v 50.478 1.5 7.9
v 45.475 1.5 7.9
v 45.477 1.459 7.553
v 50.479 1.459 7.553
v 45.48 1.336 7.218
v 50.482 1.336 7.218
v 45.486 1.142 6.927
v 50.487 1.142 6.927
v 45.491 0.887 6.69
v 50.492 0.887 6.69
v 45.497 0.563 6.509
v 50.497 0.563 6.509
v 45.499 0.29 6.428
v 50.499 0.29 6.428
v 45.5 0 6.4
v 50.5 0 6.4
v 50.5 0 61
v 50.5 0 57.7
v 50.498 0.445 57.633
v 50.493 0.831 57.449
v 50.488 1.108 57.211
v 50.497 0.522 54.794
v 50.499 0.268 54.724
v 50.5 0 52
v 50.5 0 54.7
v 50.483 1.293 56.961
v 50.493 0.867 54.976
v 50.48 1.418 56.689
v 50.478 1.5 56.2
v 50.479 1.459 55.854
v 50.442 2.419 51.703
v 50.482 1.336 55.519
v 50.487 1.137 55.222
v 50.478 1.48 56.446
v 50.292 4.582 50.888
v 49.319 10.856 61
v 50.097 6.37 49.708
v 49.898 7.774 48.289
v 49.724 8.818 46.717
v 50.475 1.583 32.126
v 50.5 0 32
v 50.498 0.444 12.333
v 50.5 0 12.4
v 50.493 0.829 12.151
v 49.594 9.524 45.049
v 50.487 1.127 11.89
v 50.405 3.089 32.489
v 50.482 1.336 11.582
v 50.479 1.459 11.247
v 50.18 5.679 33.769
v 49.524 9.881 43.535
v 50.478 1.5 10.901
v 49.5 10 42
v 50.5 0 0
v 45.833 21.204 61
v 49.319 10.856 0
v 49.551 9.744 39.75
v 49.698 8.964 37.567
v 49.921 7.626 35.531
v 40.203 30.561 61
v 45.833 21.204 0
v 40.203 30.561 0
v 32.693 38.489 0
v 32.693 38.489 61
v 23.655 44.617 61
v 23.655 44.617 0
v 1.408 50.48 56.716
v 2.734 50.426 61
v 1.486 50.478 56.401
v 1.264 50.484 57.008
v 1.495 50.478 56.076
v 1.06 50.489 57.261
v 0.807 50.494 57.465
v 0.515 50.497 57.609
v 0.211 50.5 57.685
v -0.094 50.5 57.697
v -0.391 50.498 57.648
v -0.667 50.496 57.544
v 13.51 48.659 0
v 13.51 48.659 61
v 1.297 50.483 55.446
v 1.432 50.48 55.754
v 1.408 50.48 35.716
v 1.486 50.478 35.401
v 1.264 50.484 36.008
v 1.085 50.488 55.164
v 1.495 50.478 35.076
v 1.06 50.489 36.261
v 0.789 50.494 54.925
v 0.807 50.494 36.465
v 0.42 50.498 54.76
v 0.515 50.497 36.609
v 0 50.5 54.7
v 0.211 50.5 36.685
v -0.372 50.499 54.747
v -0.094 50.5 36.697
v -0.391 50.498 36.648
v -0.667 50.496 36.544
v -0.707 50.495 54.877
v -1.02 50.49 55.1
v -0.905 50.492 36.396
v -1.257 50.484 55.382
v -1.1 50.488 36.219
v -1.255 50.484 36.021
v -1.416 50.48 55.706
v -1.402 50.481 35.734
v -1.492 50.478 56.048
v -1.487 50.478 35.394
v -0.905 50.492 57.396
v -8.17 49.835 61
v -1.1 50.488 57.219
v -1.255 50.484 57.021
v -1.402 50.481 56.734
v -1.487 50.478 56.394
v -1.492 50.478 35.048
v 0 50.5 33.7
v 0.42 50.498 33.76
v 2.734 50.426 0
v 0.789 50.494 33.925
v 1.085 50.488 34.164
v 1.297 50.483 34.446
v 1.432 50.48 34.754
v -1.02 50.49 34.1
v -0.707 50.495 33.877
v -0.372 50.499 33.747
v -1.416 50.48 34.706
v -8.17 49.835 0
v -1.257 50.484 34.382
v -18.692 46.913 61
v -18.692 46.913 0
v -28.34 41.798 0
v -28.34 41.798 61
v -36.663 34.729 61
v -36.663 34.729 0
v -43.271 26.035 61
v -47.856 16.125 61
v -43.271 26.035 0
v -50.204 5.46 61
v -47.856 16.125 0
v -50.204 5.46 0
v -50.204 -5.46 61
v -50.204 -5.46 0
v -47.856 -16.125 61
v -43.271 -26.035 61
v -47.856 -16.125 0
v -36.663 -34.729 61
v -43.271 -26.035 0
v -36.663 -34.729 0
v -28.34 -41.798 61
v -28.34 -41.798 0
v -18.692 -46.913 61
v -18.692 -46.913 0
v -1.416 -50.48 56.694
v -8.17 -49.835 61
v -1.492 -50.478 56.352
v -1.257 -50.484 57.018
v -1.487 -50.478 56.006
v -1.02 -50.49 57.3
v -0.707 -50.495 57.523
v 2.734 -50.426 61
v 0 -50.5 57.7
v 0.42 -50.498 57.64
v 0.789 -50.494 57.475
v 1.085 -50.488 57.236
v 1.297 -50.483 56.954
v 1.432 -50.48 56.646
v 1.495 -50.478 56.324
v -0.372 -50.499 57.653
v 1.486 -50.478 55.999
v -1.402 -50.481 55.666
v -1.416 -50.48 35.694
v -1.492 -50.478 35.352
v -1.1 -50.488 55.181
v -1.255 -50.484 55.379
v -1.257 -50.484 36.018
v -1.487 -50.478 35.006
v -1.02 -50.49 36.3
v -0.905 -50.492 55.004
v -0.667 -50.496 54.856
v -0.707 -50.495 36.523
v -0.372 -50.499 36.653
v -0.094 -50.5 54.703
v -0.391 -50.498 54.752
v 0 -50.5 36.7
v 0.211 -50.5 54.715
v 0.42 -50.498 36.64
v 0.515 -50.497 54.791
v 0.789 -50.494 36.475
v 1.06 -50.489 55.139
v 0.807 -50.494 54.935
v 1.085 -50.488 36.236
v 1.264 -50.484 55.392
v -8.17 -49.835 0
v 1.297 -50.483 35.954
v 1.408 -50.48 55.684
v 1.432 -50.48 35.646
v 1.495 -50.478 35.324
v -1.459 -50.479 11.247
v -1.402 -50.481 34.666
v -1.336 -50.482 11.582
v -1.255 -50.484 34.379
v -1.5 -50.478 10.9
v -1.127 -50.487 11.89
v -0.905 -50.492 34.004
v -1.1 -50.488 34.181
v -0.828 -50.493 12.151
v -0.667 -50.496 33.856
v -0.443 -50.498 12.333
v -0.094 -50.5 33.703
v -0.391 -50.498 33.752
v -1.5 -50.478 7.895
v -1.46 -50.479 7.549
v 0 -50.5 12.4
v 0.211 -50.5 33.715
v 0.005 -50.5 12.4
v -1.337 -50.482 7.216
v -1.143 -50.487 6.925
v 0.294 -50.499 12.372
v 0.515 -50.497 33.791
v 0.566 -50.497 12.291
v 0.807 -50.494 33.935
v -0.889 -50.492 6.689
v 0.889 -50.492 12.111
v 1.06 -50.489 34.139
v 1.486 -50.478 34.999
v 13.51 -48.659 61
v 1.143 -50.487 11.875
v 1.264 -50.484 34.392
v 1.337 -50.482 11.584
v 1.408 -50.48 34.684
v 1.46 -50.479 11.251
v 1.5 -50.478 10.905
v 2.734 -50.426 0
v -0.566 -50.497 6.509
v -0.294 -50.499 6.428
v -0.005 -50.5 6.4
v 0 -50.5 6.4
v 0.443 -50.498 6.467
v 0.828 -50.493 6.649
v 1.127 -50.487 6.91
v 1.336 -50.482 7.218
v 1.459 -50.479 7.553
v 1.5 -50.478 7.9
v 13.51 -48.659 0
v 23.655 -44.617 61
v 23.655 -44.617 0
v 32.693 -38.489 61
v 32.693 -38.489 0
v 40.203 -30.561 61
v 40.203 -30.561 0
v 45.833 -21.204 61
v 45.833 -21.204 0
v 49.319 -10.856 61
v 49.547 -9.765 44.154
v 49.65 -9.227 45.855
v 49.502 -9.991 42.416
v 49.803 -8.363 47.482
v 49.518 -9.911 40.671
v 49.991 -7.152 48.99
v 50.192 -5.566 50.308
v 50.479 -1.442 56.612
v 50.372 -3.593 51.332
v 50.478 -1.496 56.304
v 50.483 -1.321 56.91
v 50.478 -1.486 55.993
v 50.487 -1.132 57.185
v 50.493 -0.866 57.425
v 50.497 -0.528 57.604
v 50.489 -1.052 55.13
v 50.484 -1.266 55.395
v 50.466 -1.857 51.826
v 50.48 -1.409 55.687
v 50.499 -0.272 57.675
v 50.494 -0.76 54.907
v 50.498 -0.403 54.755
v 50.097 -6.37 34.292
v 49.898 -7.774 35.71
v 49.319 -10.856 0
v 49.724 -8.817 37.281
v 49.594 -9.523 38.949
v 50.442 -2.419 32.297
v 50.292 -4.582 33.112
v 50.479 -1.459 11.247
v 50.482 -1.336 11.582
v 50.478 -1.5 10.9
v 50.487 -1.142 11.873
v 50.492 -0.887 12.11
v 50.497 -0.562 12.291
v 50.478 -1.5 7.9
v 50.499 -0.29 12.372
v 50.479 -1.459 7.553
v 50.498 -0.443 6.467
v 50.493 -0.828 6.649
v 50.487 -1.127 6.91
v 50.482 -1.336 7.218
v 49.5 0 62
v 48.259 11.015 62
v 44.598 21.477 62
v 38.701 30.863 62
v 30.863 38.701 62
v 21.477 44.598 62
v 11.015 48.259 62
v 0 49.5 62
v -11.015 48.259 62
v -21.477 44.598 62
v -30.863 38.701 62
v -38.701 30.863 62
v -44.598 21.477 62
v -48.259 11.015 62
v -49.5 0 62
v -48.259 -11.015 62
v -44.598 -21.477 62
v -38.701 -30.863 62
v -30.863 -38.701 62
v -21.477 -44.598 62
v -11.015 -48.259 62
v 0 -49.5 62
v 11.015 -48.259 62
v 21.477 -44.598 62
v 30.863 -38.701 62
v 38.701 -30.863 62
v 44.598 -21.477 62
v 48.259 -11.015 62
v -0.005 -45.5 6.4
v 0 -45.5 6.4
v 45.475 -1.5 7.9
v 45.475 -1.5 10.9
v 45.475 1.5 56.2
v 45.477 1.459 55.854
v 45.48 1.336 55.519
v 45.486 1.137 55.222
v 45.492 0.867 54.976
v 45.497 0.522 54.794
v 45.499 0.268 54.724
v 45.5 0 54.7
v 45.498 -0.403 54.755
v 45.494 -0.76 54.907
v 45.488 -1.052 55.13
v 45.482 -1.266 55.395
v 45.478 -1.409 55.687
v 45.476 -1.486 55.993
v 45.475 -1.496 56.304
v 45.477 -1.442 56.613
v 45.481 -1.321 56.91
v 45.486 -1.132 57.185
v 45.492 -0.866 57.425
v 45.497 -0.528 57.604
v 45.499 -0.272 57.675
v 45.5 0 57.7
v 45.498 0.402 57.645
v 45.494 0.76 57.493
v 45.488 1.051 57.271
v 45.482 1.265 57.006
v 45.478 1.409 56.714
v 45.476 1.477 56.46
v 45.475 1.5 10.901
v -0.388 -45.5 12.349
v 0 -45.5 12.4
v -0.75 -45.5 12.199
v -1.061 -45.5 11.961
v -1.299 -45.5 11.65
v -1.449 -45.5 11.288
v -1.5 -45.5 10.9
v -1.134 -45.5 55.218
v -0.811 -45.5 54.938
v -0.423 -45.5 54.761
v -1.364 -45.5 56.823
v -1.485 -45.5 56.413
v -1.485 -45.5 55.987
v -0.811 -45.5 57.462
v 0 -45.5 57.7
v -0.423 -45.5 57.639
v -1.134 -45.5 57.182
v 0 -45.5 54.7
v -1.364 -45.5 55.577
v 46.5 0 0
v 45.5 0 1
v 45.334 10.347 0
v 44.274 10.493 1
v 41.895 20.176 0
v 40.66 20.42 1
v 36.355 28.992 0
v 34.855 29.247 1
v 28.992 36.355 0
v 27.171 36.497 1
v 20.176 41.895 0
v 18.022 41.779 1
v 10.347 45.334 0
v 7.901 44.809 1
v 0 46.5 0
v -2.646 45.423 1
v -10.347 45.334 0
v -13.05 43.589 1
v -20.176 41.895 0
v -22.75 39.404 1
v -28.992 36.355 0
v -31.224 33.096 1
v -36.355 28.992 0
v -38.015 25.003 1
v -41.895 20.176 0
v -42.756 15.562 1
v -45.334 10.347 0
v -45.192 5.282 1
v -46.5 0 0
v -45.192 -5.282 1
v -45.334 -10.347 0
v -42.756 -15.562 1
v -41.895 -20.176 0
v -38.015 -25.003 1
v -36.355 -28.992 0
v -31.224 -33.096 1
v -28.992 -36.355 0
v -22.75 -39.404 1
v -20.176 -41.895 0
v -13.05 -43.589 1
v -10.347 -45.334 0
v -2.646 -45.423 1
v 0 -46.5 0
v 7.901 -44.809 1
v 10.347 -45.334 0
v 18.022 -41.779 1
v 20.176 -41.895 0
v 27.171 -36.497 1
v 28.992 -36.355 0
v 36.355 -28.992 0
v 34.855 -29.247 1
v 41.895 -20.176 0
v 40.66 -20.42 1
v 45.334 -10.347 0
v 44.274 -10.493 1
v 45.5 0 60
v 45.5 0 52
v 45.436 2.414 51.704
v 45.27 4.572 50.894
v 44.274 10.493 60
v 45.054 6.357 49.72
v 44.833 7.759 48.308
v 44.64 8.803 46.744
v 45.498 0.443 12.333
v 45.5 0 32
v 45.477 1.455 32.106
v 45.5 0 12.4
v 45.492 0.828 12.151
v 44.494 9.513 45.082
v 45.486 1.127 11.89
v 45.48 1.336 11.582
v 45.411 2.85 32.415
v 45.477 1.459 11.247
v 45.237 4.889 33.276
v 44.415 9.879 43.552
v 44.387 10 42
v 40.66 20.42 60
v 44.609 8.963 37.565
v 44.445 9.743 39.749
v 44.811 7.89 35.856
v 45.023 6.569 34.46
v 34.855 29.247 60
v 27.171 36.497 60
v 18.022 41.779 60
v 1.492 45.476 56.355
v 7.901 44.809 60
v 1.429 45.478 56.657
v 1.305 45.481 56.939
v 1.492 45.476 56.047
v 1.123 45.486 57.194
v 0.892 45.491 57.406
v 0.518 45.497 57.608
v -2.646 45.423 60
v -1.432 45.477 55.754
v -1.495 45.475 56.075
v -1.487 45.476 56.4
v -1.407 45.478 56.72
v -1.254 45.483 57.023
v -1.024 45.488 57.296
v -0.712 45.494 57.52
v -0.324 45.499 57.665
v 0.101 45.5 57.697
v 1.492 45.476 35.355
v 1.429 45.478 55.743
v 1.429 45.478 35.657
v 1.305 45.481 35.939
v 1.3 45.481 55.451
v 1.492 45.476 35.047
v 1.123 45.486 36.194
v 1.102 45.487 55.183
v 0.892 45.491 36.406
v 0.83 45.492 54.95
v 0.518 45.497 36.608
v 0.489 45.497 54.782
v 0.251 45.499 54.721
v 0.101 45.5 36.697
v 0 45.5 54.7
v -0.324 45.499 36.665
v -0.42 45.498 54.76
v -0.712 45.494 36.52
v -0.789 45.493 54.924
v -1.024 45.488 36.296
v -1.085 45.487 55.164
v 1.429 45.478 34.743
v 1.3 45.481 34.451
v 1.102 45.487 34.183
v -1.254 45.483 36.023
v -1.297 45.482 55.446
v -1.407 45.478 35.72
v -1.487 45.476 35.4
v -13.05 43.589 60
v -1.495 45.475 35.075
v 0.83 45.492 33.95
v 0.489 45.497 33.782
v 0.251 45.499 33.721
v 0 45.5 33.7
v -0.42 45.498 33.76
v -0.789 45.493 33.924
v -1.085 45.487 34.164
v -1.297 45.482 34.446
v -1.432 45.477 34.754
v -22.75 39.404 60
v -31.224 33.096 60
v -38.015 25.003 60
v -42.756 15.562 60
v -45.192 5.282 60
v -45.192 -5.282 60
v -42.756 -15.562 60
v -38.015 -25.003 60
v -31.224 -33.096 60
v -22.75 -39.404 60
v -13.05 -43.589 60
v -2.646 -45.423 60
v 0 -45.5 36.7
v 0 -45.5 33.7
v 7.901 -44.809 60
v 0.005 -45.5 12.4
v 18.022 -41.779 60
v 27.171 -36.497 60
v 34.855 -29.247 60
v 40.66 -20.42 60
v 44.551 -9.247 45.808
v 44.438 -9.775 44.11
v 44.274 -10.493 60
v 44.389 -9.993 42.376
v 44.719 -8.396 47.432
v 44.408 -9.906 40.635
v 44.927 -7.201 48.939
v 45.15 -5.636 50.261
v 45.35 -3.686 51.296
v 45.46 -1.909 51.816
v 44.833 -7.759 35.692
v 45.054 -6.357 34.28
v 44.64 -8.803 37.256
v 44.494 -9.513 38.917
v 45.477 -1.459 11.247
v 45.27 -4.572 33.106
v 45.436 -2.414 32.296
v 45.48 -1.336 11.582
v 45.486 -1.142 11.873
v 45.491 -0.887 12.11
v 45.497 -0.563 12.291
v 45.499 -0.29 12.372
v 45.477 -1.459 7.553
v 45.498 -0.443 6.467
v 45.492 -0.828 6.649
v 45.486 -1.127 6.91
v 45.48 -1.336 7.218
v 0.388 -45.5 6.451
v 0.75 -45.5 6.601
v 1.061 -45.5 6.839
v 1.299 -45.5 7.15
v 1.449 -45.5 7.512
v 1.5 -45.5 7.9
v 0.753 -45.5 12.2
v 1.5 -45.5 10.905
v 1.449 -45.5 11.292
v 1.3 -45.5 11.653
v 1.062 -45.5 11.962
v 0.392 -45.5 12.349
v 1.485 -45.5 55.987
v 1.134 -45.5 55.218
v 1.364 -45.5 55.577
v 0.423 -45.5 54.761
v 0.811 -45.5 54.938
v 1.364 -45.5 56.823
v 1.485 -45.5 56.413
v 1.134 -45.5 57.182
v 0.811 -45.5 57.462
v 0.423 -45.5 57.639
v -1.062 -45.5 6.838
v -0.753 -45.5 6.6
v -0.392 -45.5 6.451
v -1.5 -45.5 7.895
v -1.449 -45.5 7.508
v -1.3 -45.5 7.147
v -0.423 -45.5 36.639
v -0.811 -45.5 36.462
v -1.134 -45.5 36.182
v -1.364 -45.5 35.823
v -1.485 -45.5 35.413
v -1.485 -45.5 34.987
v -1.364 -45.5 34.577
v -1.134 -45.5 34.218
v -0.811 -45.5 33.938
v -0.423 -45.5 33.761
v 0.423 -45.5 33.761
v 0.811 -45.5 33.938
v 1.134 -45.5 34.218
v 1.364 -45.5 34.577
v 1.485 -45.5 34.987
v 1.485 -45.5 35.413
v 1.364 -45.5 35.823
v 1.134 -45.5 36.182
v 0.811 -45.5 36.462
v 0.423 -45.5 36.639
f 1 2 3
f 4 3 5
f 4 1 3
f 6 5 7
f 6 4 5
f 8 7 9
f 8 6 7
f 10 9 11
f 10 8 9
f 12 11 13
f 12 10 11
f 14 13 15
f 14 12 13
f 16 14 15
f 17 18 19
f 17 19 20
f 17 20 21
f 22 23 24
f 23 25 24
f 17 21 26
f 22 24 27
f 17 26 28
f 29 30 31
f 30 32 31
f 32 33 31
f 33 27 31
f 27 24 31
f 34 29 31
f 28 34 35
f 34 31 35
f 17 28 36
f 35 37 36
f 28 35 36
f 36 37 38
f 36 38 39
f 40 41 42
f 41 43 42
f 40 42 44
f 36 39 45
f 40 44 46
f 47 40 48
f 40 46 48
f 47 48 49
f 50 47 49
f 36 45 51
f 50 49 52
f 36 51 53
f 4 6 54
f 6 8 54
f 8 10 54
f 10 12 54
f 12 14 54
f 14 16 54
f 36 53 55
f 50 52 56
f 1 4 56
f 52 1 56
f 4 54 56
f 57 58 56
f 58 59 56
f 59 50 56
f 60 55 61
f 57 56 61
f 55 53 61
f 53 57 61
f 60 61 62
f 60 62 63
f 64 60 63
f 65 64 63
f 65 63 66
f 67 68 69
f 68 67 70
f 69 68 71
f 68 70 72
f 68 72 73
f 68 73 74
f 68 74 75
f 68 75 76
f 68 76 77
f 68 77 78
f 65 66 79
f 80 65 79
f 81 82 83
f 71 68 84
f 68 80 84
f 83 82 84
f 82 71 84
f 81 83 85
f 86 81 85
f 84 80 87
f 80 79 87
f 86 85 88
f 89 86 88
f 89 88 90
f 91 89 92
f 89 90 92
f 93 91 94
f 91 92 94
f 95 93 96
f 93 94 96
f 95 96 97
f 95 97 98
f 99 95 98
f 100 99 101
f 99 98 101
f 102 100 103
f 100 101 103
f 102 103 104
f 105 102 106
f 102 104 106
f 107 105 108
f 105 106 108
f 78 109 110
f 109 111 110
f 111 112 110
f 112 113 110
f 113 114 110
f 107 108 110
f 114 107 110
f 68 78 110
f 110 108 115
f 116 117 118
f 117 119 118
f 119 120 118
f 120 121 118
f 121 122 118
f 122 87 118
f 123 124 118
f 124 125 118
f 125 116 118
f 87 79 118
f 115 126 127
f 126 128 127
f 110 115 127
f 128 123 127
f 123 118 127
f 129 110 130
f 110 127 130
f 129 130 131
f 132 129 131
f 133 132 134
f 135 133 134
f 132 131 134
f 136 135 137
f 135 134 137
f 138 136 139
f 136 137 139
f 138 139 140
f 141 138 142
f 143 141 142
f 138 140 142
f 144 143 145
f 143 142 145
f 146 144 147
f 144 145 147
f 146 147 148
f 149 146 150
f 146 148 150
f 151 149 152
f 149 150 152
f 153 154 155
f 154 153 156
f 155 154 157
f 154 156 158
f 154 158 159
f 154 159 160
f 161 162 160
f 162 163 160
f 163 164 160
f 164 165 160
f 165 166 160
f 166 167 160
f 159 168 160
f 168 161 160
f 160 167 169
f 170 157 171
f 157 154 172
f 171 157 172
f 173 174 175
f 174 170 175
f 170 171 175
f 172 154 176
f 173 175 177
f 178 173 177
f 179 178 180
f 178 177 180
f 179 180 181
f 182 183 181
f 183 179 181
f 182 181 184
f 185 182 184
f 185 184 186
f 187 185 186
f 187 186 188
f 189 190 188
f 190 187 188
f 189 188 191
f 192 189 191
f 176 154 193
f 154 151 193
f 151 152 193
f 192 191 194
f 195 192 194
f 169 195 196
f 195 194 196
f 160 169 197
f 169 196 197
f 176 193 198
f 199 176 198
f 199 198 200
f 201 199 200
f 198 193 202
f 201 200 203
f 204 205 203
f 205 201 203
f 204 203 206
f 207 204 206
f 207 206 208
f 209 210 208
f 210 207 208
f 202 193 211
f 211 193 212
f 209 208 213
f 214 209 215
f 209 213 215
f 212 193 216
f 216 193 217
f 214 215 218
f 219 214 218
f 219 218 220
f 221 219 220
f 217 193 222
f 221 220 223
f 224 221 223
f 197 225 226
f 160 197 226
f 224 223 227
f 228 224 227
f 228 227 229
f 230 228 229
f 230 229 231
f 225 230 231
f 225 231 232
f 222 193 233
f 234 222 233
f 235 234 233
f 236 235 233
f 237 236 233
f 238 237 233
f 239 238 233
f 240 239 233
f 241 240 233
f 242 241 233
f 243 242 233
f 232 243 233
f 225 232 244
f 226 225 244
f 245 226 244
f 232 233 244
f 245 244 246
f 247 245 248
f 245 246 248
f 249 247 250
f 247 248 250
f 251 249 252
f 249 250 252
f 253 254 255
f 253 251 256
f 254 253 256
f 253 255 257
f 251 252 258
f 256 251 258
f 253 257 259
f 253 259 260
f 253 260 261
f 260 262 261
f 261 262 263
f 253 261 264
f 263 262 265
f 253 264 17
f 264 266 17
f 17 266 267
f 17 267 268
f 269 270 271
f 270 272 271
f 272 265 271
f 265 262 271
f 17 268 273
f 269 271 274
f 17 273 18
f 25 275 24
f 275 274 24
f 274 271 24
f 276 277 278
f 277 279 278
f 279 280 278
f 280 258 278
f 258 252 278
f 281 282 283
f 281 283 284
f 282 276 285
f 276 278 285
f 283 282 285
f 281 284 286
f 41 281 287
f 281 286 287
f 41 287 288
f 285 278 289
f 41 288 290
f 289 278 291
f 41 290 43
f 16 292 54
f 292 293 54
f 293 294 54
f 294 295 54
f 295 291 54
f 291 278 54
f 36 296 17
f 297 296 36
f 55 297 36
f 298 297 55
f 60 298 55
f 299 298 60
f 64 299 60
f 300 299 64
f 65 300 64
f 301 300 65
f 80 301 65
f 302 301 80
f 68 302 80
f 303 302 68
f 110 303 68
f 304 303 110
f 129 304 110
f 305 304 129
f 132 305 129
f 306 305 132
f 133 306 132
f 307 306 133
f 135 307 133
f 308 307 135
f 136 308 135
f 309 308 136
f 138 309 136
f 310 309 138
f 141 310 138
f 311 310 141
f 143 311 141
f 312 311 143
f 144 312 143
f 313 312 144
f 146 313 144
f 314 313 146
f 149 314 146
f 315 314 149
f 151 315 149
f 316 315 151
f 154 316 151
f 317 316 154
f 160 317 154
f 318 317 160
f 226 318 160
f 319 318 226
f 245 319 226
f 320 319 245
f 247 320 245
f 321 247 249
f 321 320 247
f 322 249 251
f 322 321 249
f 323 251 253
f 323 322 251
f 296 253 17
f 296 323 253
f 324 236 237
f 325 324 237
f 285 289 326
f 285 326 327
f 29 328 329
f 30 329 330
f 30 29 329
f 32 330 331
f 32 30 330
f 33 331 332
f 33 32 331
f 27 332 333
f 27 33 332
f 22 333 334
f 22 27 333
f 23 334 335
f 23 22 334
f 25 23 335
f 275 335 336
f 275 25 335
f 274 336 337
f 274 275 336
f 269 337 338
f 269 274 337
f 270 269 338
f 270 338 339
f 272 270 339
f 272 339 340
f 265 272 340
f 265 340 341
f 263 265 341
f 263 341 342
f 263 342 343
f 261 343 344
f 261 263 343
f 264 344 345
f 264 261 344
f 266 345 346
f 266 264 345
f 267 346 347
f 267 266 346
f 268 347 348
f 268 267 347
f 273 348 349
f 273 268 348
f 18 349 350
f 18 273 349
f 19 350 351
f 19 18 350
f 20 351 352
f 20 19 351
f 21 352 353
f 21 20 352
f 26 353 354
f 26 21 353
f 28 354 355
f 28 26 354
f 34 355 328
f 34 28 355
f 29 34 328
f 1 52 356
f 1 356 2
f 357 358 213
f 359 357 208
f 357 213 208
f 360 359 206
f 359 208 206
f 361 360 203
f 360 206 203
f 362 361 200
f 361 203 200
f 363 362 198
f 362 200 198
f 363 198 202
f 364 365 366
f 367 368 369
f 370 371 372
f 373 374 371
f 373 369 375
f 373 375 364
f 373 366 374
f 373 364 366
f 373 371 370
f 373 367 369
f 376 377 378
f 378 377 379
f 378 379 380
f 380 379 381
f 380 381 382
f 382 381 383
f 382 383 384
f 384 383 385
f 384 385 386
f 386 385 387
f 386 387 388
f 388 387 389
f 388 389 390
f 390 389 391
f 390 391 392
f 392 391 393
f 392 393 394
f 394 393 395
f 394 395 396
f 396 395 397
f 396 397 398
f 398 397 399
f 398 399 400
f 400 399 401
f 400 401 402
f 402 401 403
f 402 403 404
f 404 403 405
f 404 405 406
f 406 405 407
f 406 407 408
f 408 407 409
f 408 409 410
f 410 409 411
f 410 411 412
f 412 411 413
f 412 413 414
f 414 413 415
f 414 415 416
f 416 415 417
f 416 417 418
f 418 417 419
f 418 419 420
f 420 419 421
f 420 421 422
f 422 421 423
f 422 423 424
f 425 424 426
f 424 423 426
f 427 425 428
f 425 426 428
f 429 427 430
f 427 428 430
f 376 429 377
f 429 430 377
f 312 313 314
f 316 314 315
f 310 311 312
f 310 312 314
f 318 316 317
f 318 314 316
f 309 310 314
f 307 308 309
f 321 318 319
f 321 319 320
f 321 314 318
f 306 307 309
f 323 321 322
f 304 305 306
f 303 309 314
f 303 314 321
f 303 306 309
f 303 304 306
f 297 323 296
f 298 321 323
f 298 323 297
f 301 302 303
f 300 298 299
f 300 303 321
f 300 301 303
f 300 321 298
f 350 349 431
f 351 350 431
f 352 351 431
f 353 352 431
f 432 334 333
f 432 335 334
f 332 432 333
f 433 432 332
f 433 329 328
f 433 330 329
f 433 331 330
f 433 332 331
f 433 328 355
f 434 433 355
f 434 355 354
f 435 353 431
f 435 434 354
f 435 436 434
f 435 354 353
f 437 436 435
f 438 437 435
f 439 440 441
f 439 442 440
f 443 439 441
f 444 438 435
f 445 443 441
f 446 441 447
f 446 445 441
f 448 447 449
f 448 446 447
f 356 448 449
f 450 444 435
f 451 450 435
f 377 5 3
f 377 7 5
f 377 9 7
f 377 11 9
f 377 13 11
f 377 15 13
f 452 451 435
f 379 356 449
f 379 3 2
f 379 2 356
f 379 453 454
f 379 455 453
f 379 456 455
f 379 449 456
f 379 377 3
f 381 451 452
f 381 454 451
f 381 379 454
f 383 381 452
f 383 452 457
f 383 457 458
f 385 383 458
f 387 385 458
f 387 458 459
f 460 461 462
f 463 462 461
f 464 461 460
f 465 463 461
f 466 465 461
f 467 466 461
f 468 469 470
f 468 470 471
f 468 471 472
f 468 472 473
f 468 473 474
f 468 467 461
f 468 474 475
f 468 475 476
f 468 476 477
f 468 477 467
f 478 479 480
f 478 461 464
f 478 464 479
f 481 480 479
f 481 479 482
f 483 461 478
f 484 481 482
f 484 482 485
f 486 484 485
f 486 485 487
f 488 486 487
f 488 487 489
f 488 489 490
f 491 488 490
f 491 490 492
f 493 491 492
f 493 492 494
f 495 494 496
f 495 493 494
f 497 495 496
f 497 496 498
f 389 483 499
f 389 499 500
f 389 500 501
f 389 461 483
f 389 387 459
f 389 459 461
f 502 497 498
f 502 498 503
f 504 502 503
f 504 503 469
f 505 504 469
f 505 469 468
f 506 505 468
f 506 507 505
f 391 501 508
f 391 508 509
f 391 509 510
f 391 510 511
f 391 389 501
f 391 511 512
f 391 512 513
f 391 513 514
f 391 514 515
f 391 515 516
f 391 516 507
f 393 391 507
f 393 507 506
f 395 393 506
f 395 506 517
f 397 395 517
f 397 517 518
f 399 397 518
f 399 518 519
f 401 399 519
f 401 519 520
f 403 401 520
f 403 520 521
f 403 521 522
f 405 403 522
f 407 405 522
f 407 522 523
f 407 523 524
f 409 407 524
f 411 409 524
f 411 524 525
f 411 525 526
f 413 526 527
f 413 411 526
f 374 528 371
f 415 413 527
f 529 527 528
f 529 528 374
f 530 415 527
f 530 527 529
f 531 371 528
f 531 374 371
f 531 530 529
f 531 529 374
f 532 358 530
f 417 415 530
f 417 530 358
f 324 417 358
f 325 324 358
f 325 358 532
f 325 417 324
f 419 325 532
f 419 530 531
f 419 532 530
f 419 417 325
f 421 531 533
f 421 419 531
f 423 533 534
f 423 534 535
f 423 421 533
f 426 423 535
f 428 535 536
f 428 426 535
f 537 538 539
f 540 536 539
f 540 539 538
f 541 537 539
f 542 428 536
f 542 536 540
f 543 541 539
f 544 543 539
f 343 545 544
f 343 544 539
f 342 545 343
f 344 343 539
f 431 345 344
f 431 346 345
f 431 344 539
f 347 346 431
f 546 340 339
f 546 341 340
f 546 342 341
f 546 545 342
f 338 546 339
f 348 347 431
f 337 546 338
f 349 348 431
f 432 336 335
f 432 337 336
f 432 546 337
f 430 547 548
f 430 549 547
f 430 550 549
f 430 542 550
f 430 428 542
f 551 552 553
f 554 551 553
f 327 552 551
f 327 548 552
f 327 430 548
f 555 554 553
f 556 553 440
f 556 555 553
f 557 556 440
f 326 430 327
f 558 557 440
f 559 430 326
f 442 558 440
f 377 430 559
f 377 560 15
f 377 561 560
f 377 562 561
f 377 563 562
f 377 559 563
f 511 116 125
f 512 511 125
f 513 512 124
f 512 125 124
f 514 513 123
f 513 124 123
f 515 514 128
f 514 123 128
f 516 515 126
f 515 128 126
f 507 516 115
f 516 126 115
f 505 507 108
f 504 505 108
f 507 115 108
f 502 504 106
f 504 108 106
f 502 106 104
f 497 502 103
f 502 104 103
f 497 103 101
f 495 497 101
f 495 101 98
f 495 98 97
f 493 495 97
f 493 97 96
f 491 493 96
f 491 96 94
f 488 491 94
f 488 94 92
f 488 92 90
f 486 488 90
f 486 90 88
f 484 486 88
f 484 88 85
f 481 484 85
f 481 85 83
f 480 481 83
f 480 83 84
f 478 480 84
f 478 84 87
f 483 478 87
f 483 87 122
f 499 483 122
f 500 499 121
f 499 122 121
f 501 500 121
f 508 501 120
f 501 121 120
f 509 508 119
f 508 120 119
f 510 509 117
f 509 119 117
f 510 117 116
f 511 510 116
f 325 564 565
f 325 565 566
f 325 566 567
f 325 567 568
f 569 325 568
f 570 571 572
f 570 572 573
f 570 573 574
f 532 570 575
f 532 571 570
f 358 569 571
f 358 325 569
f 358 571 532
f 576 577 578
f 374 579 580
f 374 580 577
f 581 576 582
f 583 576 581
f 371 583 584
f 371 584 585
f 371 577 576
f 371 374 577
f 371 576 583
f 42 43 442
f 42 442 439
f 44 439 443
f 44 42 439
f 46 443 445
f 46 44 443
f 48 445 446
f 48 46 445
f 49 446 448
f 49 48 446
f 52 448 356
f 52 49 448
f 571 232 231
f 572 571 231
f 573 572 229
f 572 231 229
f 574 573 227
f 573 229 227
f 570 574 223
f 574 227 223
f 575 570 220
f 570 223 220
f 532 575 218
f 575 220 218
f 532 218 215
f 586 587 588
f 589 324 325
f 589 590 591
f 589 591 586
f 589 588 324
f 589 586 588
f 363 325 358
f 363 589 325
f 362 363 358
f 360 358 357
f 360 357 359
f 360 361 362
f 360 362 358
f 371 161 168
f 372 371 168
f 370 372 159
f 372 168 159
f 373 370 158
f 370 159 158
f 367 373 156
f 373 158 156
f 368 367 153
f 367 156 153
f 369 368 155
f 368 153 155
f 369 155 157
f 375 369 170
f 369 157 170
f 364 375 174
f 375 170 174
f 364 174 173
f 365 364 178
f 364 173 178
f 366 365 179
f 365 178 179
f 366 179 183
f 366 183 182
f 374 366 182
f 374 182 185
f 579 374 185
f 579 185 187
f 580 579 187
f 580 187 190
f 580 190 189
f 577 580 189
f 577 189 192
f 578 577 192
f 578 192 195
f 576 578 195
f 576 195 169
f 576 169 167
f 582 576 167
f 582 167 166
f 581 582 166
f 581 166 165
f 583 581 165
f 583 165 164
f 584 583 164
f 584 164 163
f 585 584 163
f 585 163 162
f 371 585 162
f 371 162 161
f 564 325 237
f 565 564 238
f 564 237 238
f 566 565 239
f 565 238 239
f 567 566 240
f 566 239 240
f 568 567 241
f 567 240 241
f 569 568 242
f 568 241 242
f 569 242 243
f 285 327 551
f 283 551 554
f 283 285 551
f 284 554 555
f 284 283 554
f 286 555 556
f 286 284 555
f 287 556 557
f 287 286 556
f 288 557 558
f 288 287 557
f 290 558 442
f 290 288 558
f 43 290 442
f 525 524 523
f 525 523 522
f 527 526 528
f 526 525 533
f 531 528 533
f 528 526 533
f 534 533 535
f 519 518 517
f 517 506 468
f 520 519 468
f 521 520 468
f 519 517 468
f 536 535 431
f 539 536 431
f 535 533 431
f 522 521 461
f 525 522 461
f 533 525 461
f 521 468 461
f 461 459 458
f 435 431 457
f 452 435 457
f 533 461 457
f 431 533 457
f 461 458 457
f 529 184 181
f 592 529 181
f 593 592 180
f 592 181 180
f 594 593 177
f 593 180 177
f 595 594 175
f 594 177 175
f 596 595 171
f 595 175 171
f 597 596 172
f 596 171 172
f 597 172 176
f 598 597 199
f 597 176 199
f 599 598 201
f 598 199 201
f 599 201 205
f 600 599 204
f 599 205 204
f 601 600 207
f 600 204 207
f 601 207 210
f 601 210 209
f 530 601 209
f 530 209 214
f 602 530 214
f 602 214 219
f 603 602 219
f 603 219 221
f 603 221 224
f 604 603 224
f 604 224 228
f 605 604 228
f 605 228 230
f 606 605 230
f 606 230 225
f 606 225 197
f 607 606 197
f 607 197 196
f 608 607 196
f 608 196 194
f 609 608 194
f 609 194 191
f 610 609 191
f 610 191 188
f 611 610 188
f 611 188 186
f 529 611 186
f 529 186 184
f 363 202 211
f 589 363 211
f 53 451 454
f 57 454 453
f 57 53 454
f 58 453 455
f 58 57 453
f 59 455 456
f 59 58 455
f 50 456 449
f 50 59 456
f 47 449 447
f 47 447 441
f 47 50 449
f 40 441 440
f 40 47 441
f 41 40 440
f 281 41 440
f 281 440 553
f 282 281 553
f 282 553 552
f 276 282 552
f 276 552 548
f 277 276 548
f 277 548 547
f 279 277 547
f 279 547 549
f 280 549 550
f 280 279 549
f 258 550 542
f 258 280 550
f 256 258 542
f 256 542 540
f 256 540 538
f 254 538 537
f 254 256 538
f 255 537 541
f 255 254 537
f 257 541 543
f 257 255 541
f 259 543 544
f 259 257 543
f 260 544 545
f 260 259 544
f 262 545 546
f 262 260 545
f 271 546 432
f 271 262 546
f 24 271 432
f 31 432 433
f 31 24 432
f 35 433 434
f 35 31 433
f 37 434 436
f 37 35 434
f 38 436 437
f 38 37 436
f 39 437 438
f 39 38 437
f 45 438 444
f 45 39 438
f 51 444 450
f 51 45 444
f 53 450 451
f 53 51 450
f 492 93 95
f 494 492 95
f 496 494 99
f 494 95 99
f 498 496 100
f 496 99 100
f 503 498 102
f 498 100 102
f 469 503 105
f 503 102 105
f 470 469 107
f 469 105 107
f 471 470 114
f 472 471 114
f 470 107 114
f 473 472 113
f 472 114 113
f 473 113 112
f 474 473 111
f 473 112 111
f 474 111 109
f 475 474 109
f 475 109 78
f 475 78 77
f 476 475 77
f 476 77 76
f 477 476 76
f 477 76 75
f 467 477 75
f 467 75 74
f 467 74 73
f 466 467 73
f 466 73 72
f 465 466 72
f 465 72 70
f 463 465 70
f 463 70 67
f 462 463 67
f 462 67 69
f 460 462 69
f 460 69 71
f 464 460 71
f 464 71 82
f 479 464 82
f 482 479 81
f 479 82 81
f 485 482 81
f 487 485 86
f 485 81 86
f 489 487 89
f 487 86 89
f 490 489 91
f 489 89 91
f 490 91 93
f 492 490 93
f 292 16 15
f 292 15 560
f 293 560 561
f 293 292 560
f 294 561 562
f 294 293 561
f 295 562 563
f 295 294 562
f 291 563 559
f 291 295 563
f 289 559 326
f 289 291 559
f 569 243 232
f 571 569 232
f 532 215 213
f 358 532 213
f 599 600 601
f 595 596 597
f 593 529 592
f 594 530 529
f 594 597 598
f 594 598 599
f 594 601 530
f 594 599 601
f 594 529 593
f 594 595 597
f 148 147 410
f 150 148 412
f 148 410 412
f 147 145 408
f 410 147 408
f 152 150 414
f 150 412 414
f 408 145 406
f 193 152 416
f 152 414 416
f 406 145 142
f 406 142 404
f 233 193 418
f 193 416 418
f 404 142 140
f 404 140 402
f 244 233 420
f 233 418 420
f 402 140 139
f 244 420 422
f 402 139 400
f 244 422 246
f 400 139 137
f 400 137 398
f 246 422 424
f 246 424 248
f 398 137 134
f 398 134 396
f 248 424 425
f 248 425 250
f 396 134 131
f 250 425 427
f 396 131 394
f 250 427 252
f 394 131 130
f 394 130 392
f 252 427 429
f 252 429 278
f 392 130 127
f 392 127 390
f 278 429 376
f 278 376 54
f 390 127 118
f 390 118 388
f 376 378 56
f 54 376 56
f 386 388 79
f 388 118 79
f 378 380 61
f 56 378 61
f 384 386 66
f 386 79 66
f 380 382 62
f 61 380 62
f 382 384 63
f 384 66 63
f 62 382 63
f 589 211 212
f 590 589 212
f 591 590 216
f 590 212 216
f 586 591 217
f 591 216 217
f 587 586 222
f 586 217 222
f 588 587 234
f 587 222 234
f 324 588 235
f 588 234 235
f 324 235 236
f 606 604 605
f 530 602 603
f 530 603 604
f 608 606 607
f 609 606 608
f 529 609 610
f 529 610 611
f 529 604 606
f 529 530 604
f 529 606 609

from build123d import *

# Parameters (mm, degrees)
SKETCH_R        = 50.5
SKETCH_R_2      = 45.5
PAD_DEPTH       = 60
SKETCH002_R     = 1.5
SKETCH002_R_2   = 10
POCKET_DEPTH    = 8
SKETCH003_R     = 1.5
POCKET001_DEPTH = 8
SKETCH004_R     = 1.5
POCKET002_DEPTH = 5
SKETCH005_R     = 50.5
PAD001_DEPTH    = 2
CHAMFER_SIZE    = 1
CHAMFER001_SIZE = 1


with BuildPart() as part:
    # Sketch → Pad (new body)
    with BuildSketch(Plane.XY):
        Circle(SKETCH_R)
        Circle(SKETCH_R_2, mode=Mode.SUBTRACT)
    extrude(amount=PAD_DEPTH)

    # Sketch002 (on DatumPlane) → Pocket (cut)
    with BuildSketch(Plane(origin=(50.5, 0, 60), x_dir=(0, 1, 0), z_dir=(-1, 0, 0))):
        with Locations((0, 3.8)):
            Circle(SKETCH002_R)
        with Locations((0, 18)):
            Circle(SKETCH002_R_2)
        with BuildLine():
            Line((0, 47.6), (0.0005, 47.6))
            ThreePointArc((0.0005, 47.6), (1.060807, 48.039193), (1.5, 49.0995))
            Line((1.5, 49.0995), (1.5, 52.1005))
            ThreePointArc((1.5, 52.1005), (1.060807, 53.160807), (0.0005, 53.6))
            Line((0.0005, 53.6), (0, 53.6))
            ThreePointArc((0, 53.6), (-1.06066, 53.16066), (-1.5, 52.1))
            Line((-1.5, 52.1), (-1.5, 49.1))
            ThreePointArc((-1.5, 49.1), (-1.06066, 48.03934), (0, 47.6))
        make_face()
    extrude(amount=POCKET_DEPTH, mode=Mode.SUBTRACT)

    # Sketch003 (on DatumPlane) → Pocket001 (cut)
    with BuildSketch(Plane(origin=(0, 50.5, 60), x_dir=(0, 0, -1), z_dir=(0, 1, 0))):
        with Locations((3.8, 0)):
            Circle(SKETCH003_R)
        with Locations((24.8, 0)):
            Circle(SKETCH003_R)
    extrude(amount=-POCKET001_DEPTH, mode=Mode.SUBTRACT)

    # Sketch004 (on DatumPlane) → Pocket002 (cut)
    with BuildSketch(Plane(origin=(0, -50.5, 60), x_dir=(0, 0, 1), z_dir=(0, -1, 0))):
        with Locations((-3.8, 0)):
            Circle(SKETCH004_R)
        with Locations((-24.8, 0)):
            Circle(SKETCH004_R)
        with BuildLine():
            Line((-52.1, -1.5), (-49.095, -1.5))
            ThreePointArc((-49.095, -1.5), (-48.037875, -1.062125), (-47.6, -0.005))
            Line((-47.6, -0.005), (-47.6, 0))
            ThreePointArc((-47.6, 0), (-48.03934, 1.06066), (-49.1, 1.5))
            Line((-49.1, 1.5), (-52.105, 1.5))
            ThreePointArc((-52.105, 1.5), (-53.162125, 1.062125), (-53.6, 0.005))
            Line((-53.6, 0.005), (-53.6, 0))
            ThreePointArc((-53.6, 0), (-53.16066, -1.06066), (-52.1, -1.5))
        make_face()
    extrude(amount=-POCKET002_DEPTH, mode=Mode.SUBTRACT)

    # Sketch005 (on Face8 of Pocket002) → Pad001 (join)
    with BuildSketch(Plane.XY.offset(60)):
        Circle(SKETCH005_R)
    extrude(amount=PAD001_DEPTH)

    # Chamfer
    chamfer_edges = [part.edges().sort_by_distance(p)[0] for p in [
        (-50.5, 0, 62),
    ]]
    chamfer(chamfer_edges, length=CHAMFER_SIZE)

    # Chamfer001
    chamfer001_edges = [part.edges().sort_by_distance(p)[0] for p in [
        (-45.5, 0, 0),
    ]]
    chamfer(chamfer001_edges, length=CHAMFER001_SIZE)


solid = part.part
